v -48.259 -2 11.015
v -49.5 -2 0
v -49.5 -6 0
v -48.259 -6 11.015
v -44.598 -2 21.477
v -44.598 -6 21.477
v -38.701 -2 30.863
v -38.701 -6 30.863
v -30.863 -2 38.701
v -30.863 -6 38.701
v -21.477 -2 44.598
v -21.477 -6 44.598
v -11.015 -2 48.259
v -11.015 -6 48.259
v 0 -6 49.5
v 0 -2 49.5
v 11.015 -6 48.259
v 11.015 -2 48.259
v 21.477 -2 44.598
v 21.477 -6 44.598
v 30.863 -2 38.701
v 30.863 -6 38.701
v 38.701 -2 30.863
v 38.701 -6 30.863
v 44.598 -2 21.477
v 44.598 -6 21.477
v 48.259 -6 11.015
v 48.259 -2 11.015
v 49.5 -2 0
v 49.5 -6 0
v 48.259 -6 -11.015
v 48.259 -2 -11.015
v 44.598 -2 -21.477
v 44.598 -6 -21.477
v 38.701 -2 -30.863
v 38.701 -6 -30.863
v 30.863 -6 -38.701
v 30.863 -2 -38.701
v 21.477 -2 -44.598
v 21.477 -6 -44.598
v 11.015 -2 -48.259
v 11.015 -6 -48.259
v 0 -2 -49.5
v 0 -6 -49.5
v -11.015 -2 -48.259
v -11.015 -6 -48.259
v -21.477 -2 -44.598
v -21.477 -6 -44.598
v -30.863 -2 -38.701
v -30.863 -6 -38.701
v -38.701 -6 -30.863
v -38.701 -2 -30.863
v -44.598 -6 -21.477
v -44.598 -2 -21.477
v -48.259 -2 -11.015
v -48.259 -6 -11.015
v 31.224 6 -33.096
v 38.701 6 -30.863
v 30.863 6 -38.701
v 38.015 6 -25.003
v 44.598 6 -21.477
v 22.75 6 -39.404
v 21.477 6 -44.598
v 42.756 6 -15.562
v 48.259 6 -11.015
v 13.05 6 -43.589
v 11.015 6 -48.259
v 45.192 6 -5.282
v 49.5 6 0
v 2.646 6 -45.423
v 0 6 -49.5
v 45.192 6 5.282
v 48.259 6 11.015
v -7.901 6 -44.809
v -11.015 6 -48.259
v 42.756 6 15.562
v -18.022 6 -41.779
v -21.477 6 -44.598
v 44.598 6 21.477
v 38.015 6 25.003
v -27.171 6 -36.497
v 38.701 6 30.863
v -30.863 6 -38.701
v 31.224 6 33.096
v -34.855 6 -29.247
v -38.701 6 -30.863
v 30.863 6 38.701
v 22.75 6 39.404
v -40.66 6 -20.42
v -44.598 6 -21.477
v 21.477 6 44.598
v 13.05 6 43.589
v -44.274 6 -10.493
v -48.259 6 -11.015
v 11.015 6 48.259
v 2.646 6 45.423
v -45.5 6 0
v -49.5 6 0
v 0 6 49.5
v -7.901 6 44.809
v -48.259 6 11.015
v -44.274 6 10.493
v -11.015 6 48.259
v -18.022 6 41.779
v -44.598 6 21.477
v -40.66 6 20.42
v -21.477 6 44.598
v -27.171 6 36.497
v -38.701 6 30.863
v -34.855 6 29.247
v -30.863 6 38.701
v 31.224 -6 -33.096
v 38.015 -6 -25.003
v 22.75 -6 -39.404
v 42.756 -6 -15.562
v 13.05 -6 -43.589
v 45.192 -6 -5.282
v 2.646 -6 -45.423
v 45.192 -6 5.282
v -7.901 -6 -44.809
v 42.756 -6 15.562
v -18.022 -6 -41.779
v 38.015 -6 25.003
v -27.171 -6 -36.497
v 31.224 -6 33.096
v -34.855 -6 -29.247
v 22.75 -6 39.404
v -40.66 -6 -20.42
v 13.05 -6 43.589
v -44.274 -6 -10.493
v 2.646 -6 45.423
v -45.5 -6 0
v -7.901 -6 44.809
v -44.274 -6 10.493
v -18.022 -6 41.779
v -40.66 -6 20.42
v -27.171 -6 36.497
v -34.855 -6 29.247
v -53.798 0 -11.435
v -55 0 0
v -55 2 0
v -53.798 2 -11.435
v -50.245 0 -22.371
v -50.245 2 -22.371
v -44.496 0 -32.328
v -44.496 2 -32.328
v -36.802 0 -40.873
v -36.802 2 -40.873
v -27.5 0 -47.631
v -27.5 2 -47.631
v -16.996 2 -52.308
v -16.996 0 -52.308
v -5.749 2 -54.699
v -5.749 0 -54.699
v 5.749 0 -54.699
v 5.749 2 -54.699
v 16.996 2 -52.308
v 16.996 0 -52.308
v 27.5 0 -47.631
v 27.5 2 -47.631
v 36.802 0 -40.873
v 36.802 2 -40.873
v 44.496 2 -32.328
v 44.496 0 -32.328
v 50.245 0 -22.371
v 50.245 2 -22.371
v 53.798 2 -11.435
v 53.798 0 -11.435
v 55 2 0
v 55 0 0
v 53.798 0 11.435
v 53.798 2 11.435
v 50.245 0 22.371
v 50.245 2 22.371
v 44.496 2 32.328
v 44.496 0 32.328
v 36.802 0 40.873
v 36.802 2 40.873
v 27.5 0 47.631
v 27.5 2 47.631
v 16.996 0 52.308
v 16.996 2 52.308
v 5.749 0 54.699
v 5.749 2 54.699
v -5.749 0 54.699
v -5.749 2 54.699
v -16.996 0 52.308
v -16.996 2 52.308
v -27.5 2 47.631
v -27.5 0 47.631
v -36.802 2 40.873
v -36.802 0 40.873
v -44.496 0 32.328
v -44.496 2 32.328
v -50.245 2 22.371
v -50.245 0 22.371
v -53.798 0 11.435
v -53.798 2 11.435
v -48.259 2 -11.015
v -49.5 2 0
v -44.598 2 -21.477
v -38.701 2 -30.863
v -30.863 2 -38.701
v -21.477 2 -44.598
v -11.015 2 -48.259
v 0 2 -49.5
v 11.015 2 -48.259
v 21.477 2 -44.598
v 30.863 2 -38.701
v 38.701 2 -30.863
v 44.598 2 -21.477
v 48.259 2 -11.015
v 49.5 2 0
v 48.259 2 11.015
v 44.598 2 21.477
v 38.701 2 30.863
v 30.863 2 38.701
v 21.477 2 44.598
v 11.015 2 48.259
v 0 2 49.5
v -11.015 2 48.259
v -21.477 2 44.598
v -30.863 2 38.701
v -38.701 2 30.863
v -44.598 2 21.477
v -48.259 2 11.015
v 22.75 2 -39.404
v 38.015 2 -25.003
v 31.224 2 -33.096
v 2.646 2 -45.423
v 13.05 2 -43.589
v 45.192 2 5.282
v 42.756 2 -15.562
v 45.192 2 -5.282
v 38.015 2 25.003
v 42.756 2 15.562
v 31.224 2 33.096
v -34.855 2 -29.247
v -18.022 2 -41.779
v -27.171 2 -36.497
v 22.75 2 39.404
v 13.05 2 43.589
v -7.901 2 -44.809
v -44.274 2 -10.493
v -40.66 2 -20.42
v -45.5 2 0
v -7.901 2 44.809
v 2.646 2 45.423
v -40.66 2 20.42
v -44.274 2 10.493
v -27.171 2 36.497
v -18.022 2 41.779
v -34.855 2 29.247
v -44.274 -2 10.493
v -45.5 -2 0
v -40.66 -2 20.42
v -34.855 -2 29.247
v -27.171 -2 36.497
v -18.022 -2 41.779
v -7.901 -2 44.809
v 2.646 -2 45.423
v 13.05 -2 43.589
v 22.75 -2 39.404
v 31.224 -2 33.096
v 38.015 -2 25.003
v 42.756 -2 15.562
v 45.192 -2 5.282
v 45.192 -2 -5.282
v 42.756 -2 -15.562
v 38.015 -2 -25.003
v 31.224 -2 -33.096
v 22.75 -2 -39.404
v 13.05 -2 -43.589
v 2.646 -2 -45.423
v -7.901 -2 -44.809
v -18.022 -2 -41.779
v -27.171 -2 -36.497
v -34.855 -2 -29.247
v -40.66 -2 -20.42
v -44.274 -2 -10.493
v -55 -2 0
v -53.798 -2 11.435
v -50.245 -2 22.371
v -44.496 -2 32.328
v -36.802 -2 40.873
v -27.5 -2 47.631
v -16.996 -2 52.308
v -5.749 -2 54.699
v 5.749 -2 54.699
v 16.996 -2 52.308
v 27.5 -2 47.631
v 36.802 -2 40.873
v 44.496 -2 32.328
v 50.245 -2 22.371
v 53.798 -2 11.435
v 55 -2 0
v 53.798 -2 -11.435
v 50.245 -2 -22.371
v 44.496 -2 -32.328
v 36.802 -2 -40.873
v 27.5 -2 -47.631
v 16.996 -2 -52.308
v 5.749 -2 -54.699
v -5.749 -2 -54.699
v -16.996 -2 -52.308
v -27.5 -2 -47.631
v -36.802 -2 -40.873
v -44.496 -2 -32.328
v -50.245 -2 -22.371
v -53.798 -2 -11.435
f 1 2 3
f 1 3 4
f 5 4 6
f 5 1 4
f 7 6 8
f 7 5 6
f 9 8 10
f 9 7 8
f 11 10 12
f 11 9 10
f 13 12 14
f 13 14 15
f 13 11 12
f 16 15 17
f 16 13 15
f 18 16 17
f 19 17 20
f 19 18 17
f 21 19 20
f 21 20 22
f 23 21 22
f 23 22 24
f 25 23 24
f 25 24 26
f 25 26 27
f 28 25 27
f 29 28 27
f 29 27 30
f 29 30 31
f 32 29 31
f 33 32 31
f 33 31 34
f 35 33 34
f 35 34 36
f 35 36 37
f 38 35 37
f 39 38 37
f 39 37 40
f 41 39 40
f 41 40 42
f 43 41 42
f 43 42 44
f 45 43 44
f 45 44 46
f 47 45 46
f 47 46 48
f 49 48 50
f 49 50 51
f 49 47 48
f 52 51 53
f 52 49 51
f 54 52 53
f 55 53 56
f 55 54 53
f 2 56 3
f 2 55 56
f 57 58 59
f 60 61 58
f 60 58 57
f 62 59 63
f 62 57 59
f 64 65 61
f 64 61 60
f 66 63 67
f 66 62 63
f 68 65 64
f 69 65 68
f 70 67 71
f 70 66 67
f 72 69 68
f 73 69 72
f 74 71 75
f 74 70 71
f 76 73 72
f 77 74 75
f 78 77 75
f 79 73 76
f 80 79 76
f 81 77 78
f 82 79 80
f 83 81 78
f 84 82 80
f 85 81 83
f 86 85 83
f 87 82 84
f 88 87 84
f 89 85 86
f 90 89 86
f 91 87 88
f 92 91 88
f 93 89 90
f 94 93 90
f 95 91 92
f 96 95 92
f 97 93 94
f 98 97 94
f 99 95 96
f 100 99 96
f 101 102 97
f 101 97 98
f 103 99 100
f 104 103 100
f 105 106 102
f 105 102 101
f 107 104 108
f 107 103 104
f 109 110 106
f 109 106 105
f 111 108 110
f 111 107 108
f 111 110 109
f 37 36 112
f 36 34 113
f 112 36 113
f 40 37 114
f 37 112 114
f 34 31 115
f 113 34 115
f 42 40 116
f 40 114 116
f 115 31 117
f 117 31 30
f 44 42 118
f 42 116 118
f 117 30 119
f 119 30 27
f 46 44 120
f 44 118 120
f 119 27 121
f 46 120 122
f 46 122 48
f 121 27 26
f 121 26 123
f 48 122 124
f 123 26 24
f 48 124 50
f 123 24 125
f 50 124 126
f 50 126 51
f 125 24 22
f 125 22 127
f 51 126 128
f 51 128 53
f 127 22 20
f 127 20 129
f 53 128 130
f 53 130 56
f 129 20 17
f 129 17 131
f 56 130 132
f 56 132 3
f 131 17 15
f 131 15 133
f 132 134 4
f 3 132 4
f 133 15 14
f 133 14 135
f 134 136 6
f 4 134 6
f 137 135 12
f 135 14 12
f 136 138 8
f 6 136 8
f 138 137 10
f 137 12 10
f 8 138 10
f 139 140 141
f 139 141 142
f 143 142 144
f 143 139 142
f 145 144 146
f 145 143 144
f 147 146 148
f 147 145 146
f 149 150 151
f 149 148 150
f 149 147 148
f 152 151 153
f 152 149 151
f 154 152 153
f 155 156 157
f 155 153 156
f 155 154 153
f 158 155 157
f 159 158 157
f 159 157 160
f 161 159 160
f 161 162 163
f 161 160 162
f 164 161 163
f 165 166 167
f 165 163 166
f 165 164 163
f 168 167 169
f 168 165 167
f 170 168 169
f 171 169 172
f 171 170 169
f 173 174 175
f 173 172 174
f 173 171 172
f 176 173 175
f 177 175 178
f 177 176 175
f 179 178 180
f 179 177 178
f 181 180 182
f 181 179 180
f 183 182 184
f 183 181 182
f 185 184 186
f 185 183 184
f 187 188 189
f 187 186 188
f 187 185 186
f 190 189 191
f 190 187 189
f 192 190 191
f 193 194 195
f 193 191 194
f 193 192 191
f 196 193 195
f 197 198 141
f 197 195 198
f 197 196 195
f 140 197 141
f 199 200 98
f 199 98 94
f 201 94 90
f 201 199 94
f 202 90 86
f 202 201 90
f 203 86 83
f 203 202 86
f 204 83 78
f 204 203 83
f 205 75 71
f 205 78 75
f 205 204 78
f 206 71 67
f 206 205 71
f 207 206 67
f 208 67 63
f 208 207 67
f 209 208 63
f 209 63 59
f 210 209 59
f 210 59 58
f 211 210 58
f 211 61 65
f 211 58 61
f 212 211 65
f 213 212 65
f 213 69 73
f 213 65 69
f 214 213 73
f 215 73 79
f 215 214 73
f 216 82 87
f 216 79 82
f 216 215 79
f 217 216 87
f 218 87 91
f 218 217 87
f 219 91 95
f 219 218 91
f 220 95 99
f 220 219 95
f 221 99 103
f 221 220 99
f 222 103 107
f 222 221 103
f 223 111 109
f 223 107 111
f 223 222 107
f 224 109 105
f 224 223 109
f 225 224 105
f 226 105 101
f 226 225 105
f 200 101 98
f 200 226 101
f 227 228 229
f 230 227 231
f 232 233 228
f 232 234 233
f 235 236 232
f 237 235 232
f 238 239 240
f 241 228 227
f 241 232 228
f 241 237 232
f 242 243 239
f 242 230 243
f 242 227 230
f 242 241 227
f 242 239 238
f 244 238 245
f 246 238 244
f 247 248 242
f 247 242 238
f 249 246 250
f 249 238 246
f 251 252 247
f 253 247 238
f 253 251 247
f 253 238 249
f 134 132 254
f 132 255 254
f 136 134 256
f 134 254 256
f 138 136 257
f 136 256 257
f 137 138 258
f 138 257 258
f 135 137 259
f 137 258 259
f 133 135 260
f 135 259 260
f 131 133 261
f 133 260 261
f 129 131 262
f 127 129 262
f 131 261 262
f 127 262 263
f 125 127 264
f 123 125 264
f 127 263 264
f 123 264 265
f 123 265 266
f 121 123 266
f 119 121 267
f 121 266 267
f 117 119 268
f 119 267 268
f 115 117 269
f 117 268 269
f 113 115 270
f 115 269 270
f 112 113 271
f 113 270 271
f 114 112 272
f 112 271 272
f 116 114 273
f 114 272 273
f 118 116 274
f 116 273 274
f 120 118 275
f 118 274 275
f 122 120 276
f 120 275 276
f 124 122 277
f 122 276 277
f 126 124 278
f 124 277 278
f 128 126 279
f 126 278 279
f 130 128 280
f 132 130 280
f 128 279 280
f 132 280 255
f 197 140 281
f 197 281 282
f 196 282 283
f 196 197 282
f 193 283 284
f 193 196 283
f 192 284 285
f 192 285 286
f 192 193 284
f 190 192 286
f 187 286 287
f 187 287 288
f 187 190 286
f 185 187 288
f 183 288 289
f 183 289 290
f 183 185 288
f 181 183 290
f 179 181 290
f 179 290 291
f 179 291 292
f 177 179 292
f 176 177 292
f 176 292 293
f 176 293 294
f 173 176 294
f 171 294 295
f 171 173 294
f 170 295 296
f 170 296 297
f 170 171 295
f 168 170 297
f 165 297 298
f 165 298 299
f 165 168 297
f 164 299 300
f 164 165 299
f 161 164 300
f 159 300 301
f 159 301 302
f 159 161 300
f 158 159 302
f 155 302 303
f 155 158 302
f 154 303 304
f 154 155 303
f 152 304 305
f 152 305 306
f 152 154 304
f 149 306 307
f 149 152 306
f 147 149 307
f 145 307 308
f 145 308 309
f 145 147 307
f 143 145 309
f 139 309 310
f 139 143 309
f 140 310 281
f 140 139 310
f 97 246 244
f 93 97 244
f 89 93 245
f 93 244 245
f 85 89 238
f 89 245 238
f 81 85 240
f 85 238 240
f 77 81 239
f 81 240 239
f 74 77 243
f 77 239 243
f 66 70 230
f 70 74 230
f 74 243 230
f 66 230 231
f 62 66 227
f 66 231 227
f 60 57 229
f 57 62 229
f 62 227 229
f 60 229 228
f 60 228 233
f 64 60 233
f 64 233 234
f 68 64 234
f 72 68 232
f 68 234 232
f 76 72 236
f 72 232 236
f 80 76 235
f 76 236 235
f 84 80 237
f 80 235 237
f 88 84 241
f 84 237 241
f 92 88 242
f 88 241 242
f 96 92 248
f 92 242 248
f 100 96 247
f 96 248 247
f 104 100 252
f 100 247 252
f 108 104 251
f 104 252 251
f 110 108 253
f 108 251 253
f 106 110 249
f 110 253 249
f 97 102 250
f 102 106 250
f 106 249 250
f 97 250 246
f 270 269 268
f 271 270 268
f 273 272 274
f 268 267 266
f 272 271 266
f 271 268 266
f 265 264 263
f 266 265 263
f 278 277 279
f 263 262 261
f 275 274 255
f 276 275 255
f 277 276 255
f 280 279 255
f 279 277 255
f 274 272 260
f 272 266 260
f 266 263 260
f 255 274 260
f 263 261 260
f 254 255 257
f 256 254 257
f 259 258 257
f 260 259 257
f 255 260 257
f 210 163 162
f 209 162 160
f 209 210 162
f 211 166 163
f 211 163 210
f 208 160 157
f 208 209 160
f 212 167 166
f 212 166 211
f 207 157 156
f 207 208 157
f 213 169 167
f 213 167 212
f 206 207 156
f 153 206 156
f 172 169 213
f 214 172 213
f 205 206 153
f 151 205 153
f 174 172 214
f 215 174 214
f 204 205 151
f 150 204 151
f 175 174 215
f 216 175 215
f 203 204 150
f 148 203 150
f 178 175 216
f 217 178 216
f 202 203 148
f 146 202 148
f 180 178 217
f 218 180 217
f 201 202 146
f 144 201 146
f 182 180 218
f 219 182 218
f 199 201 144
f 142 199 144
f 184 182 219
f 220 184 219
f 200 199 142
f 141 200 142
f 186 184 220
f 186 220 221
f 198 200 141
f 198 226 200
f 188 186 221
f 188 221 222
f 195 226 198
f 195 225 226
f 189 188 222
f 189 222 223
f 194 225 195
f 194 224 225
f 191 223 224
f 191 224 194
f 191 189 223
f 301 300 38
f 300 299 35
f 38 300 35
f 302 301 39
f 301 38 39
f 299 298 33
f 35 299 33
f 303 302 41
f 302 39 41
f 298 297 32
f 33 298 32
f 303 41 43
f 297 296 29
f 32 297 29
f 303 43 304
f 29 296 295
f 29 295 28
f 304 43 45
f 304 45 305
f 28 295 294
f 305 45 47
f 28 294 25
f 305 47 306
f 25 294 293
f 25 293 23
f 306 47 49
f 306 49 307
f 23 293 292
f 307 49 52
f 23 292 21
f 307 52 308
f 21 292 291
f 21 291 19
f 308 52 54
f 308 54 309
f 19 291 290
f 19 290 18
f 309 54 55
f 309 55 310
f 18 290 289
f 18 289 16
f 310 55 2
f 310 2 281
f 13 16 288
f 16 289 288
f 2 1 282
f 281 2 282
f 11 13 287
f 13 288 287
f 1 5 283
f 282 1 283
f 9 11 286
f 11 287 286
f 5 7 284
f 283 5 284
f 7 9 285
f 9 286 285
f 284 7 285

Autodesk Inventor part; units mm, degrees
ref_plane "YZ Plane" through (0, 0, 0) normal (1, 0, 0) x (0, 1, 0)
ref_plane "XZ Plane" through (0, 0, 0) normal (0, 1, 0) x (-1, 0, 0)
ref_plane "XY Plane" through (0, 0, 0) normal (0, 0, 1) x (1, 0, 0)
sketch "Эскиз1" plane through (0, 0, 0) normal (0, 1, 0) x (-1, 0, 0)
  circle A0 centre (0, 0) radius 55
  dimension "d0" = 110
extrude "Выдавливание1" add sketch "Эскиз1" along normal mid plane 4
sketch "Эскиз2" plane through (0, 0, 0) normal (0, 1, 0) x (-1, 0, 0)
  circle A0 centre (0, 0) radius 55 projected
  circle A1 centre (0, 0) radius 49.5
  circle A2 centre (0, 0) radius 45.5
  point P0 (0, 49.5)
  point P1 (0, 45.5)
  dimension "d4" = 99
  dimension "d5" = 4
extrude "Выдавливание2" add sketch "Эскиз2" along normal mid plane 12 contours A1
properties part number "внутреннее кольцо подшипника"
